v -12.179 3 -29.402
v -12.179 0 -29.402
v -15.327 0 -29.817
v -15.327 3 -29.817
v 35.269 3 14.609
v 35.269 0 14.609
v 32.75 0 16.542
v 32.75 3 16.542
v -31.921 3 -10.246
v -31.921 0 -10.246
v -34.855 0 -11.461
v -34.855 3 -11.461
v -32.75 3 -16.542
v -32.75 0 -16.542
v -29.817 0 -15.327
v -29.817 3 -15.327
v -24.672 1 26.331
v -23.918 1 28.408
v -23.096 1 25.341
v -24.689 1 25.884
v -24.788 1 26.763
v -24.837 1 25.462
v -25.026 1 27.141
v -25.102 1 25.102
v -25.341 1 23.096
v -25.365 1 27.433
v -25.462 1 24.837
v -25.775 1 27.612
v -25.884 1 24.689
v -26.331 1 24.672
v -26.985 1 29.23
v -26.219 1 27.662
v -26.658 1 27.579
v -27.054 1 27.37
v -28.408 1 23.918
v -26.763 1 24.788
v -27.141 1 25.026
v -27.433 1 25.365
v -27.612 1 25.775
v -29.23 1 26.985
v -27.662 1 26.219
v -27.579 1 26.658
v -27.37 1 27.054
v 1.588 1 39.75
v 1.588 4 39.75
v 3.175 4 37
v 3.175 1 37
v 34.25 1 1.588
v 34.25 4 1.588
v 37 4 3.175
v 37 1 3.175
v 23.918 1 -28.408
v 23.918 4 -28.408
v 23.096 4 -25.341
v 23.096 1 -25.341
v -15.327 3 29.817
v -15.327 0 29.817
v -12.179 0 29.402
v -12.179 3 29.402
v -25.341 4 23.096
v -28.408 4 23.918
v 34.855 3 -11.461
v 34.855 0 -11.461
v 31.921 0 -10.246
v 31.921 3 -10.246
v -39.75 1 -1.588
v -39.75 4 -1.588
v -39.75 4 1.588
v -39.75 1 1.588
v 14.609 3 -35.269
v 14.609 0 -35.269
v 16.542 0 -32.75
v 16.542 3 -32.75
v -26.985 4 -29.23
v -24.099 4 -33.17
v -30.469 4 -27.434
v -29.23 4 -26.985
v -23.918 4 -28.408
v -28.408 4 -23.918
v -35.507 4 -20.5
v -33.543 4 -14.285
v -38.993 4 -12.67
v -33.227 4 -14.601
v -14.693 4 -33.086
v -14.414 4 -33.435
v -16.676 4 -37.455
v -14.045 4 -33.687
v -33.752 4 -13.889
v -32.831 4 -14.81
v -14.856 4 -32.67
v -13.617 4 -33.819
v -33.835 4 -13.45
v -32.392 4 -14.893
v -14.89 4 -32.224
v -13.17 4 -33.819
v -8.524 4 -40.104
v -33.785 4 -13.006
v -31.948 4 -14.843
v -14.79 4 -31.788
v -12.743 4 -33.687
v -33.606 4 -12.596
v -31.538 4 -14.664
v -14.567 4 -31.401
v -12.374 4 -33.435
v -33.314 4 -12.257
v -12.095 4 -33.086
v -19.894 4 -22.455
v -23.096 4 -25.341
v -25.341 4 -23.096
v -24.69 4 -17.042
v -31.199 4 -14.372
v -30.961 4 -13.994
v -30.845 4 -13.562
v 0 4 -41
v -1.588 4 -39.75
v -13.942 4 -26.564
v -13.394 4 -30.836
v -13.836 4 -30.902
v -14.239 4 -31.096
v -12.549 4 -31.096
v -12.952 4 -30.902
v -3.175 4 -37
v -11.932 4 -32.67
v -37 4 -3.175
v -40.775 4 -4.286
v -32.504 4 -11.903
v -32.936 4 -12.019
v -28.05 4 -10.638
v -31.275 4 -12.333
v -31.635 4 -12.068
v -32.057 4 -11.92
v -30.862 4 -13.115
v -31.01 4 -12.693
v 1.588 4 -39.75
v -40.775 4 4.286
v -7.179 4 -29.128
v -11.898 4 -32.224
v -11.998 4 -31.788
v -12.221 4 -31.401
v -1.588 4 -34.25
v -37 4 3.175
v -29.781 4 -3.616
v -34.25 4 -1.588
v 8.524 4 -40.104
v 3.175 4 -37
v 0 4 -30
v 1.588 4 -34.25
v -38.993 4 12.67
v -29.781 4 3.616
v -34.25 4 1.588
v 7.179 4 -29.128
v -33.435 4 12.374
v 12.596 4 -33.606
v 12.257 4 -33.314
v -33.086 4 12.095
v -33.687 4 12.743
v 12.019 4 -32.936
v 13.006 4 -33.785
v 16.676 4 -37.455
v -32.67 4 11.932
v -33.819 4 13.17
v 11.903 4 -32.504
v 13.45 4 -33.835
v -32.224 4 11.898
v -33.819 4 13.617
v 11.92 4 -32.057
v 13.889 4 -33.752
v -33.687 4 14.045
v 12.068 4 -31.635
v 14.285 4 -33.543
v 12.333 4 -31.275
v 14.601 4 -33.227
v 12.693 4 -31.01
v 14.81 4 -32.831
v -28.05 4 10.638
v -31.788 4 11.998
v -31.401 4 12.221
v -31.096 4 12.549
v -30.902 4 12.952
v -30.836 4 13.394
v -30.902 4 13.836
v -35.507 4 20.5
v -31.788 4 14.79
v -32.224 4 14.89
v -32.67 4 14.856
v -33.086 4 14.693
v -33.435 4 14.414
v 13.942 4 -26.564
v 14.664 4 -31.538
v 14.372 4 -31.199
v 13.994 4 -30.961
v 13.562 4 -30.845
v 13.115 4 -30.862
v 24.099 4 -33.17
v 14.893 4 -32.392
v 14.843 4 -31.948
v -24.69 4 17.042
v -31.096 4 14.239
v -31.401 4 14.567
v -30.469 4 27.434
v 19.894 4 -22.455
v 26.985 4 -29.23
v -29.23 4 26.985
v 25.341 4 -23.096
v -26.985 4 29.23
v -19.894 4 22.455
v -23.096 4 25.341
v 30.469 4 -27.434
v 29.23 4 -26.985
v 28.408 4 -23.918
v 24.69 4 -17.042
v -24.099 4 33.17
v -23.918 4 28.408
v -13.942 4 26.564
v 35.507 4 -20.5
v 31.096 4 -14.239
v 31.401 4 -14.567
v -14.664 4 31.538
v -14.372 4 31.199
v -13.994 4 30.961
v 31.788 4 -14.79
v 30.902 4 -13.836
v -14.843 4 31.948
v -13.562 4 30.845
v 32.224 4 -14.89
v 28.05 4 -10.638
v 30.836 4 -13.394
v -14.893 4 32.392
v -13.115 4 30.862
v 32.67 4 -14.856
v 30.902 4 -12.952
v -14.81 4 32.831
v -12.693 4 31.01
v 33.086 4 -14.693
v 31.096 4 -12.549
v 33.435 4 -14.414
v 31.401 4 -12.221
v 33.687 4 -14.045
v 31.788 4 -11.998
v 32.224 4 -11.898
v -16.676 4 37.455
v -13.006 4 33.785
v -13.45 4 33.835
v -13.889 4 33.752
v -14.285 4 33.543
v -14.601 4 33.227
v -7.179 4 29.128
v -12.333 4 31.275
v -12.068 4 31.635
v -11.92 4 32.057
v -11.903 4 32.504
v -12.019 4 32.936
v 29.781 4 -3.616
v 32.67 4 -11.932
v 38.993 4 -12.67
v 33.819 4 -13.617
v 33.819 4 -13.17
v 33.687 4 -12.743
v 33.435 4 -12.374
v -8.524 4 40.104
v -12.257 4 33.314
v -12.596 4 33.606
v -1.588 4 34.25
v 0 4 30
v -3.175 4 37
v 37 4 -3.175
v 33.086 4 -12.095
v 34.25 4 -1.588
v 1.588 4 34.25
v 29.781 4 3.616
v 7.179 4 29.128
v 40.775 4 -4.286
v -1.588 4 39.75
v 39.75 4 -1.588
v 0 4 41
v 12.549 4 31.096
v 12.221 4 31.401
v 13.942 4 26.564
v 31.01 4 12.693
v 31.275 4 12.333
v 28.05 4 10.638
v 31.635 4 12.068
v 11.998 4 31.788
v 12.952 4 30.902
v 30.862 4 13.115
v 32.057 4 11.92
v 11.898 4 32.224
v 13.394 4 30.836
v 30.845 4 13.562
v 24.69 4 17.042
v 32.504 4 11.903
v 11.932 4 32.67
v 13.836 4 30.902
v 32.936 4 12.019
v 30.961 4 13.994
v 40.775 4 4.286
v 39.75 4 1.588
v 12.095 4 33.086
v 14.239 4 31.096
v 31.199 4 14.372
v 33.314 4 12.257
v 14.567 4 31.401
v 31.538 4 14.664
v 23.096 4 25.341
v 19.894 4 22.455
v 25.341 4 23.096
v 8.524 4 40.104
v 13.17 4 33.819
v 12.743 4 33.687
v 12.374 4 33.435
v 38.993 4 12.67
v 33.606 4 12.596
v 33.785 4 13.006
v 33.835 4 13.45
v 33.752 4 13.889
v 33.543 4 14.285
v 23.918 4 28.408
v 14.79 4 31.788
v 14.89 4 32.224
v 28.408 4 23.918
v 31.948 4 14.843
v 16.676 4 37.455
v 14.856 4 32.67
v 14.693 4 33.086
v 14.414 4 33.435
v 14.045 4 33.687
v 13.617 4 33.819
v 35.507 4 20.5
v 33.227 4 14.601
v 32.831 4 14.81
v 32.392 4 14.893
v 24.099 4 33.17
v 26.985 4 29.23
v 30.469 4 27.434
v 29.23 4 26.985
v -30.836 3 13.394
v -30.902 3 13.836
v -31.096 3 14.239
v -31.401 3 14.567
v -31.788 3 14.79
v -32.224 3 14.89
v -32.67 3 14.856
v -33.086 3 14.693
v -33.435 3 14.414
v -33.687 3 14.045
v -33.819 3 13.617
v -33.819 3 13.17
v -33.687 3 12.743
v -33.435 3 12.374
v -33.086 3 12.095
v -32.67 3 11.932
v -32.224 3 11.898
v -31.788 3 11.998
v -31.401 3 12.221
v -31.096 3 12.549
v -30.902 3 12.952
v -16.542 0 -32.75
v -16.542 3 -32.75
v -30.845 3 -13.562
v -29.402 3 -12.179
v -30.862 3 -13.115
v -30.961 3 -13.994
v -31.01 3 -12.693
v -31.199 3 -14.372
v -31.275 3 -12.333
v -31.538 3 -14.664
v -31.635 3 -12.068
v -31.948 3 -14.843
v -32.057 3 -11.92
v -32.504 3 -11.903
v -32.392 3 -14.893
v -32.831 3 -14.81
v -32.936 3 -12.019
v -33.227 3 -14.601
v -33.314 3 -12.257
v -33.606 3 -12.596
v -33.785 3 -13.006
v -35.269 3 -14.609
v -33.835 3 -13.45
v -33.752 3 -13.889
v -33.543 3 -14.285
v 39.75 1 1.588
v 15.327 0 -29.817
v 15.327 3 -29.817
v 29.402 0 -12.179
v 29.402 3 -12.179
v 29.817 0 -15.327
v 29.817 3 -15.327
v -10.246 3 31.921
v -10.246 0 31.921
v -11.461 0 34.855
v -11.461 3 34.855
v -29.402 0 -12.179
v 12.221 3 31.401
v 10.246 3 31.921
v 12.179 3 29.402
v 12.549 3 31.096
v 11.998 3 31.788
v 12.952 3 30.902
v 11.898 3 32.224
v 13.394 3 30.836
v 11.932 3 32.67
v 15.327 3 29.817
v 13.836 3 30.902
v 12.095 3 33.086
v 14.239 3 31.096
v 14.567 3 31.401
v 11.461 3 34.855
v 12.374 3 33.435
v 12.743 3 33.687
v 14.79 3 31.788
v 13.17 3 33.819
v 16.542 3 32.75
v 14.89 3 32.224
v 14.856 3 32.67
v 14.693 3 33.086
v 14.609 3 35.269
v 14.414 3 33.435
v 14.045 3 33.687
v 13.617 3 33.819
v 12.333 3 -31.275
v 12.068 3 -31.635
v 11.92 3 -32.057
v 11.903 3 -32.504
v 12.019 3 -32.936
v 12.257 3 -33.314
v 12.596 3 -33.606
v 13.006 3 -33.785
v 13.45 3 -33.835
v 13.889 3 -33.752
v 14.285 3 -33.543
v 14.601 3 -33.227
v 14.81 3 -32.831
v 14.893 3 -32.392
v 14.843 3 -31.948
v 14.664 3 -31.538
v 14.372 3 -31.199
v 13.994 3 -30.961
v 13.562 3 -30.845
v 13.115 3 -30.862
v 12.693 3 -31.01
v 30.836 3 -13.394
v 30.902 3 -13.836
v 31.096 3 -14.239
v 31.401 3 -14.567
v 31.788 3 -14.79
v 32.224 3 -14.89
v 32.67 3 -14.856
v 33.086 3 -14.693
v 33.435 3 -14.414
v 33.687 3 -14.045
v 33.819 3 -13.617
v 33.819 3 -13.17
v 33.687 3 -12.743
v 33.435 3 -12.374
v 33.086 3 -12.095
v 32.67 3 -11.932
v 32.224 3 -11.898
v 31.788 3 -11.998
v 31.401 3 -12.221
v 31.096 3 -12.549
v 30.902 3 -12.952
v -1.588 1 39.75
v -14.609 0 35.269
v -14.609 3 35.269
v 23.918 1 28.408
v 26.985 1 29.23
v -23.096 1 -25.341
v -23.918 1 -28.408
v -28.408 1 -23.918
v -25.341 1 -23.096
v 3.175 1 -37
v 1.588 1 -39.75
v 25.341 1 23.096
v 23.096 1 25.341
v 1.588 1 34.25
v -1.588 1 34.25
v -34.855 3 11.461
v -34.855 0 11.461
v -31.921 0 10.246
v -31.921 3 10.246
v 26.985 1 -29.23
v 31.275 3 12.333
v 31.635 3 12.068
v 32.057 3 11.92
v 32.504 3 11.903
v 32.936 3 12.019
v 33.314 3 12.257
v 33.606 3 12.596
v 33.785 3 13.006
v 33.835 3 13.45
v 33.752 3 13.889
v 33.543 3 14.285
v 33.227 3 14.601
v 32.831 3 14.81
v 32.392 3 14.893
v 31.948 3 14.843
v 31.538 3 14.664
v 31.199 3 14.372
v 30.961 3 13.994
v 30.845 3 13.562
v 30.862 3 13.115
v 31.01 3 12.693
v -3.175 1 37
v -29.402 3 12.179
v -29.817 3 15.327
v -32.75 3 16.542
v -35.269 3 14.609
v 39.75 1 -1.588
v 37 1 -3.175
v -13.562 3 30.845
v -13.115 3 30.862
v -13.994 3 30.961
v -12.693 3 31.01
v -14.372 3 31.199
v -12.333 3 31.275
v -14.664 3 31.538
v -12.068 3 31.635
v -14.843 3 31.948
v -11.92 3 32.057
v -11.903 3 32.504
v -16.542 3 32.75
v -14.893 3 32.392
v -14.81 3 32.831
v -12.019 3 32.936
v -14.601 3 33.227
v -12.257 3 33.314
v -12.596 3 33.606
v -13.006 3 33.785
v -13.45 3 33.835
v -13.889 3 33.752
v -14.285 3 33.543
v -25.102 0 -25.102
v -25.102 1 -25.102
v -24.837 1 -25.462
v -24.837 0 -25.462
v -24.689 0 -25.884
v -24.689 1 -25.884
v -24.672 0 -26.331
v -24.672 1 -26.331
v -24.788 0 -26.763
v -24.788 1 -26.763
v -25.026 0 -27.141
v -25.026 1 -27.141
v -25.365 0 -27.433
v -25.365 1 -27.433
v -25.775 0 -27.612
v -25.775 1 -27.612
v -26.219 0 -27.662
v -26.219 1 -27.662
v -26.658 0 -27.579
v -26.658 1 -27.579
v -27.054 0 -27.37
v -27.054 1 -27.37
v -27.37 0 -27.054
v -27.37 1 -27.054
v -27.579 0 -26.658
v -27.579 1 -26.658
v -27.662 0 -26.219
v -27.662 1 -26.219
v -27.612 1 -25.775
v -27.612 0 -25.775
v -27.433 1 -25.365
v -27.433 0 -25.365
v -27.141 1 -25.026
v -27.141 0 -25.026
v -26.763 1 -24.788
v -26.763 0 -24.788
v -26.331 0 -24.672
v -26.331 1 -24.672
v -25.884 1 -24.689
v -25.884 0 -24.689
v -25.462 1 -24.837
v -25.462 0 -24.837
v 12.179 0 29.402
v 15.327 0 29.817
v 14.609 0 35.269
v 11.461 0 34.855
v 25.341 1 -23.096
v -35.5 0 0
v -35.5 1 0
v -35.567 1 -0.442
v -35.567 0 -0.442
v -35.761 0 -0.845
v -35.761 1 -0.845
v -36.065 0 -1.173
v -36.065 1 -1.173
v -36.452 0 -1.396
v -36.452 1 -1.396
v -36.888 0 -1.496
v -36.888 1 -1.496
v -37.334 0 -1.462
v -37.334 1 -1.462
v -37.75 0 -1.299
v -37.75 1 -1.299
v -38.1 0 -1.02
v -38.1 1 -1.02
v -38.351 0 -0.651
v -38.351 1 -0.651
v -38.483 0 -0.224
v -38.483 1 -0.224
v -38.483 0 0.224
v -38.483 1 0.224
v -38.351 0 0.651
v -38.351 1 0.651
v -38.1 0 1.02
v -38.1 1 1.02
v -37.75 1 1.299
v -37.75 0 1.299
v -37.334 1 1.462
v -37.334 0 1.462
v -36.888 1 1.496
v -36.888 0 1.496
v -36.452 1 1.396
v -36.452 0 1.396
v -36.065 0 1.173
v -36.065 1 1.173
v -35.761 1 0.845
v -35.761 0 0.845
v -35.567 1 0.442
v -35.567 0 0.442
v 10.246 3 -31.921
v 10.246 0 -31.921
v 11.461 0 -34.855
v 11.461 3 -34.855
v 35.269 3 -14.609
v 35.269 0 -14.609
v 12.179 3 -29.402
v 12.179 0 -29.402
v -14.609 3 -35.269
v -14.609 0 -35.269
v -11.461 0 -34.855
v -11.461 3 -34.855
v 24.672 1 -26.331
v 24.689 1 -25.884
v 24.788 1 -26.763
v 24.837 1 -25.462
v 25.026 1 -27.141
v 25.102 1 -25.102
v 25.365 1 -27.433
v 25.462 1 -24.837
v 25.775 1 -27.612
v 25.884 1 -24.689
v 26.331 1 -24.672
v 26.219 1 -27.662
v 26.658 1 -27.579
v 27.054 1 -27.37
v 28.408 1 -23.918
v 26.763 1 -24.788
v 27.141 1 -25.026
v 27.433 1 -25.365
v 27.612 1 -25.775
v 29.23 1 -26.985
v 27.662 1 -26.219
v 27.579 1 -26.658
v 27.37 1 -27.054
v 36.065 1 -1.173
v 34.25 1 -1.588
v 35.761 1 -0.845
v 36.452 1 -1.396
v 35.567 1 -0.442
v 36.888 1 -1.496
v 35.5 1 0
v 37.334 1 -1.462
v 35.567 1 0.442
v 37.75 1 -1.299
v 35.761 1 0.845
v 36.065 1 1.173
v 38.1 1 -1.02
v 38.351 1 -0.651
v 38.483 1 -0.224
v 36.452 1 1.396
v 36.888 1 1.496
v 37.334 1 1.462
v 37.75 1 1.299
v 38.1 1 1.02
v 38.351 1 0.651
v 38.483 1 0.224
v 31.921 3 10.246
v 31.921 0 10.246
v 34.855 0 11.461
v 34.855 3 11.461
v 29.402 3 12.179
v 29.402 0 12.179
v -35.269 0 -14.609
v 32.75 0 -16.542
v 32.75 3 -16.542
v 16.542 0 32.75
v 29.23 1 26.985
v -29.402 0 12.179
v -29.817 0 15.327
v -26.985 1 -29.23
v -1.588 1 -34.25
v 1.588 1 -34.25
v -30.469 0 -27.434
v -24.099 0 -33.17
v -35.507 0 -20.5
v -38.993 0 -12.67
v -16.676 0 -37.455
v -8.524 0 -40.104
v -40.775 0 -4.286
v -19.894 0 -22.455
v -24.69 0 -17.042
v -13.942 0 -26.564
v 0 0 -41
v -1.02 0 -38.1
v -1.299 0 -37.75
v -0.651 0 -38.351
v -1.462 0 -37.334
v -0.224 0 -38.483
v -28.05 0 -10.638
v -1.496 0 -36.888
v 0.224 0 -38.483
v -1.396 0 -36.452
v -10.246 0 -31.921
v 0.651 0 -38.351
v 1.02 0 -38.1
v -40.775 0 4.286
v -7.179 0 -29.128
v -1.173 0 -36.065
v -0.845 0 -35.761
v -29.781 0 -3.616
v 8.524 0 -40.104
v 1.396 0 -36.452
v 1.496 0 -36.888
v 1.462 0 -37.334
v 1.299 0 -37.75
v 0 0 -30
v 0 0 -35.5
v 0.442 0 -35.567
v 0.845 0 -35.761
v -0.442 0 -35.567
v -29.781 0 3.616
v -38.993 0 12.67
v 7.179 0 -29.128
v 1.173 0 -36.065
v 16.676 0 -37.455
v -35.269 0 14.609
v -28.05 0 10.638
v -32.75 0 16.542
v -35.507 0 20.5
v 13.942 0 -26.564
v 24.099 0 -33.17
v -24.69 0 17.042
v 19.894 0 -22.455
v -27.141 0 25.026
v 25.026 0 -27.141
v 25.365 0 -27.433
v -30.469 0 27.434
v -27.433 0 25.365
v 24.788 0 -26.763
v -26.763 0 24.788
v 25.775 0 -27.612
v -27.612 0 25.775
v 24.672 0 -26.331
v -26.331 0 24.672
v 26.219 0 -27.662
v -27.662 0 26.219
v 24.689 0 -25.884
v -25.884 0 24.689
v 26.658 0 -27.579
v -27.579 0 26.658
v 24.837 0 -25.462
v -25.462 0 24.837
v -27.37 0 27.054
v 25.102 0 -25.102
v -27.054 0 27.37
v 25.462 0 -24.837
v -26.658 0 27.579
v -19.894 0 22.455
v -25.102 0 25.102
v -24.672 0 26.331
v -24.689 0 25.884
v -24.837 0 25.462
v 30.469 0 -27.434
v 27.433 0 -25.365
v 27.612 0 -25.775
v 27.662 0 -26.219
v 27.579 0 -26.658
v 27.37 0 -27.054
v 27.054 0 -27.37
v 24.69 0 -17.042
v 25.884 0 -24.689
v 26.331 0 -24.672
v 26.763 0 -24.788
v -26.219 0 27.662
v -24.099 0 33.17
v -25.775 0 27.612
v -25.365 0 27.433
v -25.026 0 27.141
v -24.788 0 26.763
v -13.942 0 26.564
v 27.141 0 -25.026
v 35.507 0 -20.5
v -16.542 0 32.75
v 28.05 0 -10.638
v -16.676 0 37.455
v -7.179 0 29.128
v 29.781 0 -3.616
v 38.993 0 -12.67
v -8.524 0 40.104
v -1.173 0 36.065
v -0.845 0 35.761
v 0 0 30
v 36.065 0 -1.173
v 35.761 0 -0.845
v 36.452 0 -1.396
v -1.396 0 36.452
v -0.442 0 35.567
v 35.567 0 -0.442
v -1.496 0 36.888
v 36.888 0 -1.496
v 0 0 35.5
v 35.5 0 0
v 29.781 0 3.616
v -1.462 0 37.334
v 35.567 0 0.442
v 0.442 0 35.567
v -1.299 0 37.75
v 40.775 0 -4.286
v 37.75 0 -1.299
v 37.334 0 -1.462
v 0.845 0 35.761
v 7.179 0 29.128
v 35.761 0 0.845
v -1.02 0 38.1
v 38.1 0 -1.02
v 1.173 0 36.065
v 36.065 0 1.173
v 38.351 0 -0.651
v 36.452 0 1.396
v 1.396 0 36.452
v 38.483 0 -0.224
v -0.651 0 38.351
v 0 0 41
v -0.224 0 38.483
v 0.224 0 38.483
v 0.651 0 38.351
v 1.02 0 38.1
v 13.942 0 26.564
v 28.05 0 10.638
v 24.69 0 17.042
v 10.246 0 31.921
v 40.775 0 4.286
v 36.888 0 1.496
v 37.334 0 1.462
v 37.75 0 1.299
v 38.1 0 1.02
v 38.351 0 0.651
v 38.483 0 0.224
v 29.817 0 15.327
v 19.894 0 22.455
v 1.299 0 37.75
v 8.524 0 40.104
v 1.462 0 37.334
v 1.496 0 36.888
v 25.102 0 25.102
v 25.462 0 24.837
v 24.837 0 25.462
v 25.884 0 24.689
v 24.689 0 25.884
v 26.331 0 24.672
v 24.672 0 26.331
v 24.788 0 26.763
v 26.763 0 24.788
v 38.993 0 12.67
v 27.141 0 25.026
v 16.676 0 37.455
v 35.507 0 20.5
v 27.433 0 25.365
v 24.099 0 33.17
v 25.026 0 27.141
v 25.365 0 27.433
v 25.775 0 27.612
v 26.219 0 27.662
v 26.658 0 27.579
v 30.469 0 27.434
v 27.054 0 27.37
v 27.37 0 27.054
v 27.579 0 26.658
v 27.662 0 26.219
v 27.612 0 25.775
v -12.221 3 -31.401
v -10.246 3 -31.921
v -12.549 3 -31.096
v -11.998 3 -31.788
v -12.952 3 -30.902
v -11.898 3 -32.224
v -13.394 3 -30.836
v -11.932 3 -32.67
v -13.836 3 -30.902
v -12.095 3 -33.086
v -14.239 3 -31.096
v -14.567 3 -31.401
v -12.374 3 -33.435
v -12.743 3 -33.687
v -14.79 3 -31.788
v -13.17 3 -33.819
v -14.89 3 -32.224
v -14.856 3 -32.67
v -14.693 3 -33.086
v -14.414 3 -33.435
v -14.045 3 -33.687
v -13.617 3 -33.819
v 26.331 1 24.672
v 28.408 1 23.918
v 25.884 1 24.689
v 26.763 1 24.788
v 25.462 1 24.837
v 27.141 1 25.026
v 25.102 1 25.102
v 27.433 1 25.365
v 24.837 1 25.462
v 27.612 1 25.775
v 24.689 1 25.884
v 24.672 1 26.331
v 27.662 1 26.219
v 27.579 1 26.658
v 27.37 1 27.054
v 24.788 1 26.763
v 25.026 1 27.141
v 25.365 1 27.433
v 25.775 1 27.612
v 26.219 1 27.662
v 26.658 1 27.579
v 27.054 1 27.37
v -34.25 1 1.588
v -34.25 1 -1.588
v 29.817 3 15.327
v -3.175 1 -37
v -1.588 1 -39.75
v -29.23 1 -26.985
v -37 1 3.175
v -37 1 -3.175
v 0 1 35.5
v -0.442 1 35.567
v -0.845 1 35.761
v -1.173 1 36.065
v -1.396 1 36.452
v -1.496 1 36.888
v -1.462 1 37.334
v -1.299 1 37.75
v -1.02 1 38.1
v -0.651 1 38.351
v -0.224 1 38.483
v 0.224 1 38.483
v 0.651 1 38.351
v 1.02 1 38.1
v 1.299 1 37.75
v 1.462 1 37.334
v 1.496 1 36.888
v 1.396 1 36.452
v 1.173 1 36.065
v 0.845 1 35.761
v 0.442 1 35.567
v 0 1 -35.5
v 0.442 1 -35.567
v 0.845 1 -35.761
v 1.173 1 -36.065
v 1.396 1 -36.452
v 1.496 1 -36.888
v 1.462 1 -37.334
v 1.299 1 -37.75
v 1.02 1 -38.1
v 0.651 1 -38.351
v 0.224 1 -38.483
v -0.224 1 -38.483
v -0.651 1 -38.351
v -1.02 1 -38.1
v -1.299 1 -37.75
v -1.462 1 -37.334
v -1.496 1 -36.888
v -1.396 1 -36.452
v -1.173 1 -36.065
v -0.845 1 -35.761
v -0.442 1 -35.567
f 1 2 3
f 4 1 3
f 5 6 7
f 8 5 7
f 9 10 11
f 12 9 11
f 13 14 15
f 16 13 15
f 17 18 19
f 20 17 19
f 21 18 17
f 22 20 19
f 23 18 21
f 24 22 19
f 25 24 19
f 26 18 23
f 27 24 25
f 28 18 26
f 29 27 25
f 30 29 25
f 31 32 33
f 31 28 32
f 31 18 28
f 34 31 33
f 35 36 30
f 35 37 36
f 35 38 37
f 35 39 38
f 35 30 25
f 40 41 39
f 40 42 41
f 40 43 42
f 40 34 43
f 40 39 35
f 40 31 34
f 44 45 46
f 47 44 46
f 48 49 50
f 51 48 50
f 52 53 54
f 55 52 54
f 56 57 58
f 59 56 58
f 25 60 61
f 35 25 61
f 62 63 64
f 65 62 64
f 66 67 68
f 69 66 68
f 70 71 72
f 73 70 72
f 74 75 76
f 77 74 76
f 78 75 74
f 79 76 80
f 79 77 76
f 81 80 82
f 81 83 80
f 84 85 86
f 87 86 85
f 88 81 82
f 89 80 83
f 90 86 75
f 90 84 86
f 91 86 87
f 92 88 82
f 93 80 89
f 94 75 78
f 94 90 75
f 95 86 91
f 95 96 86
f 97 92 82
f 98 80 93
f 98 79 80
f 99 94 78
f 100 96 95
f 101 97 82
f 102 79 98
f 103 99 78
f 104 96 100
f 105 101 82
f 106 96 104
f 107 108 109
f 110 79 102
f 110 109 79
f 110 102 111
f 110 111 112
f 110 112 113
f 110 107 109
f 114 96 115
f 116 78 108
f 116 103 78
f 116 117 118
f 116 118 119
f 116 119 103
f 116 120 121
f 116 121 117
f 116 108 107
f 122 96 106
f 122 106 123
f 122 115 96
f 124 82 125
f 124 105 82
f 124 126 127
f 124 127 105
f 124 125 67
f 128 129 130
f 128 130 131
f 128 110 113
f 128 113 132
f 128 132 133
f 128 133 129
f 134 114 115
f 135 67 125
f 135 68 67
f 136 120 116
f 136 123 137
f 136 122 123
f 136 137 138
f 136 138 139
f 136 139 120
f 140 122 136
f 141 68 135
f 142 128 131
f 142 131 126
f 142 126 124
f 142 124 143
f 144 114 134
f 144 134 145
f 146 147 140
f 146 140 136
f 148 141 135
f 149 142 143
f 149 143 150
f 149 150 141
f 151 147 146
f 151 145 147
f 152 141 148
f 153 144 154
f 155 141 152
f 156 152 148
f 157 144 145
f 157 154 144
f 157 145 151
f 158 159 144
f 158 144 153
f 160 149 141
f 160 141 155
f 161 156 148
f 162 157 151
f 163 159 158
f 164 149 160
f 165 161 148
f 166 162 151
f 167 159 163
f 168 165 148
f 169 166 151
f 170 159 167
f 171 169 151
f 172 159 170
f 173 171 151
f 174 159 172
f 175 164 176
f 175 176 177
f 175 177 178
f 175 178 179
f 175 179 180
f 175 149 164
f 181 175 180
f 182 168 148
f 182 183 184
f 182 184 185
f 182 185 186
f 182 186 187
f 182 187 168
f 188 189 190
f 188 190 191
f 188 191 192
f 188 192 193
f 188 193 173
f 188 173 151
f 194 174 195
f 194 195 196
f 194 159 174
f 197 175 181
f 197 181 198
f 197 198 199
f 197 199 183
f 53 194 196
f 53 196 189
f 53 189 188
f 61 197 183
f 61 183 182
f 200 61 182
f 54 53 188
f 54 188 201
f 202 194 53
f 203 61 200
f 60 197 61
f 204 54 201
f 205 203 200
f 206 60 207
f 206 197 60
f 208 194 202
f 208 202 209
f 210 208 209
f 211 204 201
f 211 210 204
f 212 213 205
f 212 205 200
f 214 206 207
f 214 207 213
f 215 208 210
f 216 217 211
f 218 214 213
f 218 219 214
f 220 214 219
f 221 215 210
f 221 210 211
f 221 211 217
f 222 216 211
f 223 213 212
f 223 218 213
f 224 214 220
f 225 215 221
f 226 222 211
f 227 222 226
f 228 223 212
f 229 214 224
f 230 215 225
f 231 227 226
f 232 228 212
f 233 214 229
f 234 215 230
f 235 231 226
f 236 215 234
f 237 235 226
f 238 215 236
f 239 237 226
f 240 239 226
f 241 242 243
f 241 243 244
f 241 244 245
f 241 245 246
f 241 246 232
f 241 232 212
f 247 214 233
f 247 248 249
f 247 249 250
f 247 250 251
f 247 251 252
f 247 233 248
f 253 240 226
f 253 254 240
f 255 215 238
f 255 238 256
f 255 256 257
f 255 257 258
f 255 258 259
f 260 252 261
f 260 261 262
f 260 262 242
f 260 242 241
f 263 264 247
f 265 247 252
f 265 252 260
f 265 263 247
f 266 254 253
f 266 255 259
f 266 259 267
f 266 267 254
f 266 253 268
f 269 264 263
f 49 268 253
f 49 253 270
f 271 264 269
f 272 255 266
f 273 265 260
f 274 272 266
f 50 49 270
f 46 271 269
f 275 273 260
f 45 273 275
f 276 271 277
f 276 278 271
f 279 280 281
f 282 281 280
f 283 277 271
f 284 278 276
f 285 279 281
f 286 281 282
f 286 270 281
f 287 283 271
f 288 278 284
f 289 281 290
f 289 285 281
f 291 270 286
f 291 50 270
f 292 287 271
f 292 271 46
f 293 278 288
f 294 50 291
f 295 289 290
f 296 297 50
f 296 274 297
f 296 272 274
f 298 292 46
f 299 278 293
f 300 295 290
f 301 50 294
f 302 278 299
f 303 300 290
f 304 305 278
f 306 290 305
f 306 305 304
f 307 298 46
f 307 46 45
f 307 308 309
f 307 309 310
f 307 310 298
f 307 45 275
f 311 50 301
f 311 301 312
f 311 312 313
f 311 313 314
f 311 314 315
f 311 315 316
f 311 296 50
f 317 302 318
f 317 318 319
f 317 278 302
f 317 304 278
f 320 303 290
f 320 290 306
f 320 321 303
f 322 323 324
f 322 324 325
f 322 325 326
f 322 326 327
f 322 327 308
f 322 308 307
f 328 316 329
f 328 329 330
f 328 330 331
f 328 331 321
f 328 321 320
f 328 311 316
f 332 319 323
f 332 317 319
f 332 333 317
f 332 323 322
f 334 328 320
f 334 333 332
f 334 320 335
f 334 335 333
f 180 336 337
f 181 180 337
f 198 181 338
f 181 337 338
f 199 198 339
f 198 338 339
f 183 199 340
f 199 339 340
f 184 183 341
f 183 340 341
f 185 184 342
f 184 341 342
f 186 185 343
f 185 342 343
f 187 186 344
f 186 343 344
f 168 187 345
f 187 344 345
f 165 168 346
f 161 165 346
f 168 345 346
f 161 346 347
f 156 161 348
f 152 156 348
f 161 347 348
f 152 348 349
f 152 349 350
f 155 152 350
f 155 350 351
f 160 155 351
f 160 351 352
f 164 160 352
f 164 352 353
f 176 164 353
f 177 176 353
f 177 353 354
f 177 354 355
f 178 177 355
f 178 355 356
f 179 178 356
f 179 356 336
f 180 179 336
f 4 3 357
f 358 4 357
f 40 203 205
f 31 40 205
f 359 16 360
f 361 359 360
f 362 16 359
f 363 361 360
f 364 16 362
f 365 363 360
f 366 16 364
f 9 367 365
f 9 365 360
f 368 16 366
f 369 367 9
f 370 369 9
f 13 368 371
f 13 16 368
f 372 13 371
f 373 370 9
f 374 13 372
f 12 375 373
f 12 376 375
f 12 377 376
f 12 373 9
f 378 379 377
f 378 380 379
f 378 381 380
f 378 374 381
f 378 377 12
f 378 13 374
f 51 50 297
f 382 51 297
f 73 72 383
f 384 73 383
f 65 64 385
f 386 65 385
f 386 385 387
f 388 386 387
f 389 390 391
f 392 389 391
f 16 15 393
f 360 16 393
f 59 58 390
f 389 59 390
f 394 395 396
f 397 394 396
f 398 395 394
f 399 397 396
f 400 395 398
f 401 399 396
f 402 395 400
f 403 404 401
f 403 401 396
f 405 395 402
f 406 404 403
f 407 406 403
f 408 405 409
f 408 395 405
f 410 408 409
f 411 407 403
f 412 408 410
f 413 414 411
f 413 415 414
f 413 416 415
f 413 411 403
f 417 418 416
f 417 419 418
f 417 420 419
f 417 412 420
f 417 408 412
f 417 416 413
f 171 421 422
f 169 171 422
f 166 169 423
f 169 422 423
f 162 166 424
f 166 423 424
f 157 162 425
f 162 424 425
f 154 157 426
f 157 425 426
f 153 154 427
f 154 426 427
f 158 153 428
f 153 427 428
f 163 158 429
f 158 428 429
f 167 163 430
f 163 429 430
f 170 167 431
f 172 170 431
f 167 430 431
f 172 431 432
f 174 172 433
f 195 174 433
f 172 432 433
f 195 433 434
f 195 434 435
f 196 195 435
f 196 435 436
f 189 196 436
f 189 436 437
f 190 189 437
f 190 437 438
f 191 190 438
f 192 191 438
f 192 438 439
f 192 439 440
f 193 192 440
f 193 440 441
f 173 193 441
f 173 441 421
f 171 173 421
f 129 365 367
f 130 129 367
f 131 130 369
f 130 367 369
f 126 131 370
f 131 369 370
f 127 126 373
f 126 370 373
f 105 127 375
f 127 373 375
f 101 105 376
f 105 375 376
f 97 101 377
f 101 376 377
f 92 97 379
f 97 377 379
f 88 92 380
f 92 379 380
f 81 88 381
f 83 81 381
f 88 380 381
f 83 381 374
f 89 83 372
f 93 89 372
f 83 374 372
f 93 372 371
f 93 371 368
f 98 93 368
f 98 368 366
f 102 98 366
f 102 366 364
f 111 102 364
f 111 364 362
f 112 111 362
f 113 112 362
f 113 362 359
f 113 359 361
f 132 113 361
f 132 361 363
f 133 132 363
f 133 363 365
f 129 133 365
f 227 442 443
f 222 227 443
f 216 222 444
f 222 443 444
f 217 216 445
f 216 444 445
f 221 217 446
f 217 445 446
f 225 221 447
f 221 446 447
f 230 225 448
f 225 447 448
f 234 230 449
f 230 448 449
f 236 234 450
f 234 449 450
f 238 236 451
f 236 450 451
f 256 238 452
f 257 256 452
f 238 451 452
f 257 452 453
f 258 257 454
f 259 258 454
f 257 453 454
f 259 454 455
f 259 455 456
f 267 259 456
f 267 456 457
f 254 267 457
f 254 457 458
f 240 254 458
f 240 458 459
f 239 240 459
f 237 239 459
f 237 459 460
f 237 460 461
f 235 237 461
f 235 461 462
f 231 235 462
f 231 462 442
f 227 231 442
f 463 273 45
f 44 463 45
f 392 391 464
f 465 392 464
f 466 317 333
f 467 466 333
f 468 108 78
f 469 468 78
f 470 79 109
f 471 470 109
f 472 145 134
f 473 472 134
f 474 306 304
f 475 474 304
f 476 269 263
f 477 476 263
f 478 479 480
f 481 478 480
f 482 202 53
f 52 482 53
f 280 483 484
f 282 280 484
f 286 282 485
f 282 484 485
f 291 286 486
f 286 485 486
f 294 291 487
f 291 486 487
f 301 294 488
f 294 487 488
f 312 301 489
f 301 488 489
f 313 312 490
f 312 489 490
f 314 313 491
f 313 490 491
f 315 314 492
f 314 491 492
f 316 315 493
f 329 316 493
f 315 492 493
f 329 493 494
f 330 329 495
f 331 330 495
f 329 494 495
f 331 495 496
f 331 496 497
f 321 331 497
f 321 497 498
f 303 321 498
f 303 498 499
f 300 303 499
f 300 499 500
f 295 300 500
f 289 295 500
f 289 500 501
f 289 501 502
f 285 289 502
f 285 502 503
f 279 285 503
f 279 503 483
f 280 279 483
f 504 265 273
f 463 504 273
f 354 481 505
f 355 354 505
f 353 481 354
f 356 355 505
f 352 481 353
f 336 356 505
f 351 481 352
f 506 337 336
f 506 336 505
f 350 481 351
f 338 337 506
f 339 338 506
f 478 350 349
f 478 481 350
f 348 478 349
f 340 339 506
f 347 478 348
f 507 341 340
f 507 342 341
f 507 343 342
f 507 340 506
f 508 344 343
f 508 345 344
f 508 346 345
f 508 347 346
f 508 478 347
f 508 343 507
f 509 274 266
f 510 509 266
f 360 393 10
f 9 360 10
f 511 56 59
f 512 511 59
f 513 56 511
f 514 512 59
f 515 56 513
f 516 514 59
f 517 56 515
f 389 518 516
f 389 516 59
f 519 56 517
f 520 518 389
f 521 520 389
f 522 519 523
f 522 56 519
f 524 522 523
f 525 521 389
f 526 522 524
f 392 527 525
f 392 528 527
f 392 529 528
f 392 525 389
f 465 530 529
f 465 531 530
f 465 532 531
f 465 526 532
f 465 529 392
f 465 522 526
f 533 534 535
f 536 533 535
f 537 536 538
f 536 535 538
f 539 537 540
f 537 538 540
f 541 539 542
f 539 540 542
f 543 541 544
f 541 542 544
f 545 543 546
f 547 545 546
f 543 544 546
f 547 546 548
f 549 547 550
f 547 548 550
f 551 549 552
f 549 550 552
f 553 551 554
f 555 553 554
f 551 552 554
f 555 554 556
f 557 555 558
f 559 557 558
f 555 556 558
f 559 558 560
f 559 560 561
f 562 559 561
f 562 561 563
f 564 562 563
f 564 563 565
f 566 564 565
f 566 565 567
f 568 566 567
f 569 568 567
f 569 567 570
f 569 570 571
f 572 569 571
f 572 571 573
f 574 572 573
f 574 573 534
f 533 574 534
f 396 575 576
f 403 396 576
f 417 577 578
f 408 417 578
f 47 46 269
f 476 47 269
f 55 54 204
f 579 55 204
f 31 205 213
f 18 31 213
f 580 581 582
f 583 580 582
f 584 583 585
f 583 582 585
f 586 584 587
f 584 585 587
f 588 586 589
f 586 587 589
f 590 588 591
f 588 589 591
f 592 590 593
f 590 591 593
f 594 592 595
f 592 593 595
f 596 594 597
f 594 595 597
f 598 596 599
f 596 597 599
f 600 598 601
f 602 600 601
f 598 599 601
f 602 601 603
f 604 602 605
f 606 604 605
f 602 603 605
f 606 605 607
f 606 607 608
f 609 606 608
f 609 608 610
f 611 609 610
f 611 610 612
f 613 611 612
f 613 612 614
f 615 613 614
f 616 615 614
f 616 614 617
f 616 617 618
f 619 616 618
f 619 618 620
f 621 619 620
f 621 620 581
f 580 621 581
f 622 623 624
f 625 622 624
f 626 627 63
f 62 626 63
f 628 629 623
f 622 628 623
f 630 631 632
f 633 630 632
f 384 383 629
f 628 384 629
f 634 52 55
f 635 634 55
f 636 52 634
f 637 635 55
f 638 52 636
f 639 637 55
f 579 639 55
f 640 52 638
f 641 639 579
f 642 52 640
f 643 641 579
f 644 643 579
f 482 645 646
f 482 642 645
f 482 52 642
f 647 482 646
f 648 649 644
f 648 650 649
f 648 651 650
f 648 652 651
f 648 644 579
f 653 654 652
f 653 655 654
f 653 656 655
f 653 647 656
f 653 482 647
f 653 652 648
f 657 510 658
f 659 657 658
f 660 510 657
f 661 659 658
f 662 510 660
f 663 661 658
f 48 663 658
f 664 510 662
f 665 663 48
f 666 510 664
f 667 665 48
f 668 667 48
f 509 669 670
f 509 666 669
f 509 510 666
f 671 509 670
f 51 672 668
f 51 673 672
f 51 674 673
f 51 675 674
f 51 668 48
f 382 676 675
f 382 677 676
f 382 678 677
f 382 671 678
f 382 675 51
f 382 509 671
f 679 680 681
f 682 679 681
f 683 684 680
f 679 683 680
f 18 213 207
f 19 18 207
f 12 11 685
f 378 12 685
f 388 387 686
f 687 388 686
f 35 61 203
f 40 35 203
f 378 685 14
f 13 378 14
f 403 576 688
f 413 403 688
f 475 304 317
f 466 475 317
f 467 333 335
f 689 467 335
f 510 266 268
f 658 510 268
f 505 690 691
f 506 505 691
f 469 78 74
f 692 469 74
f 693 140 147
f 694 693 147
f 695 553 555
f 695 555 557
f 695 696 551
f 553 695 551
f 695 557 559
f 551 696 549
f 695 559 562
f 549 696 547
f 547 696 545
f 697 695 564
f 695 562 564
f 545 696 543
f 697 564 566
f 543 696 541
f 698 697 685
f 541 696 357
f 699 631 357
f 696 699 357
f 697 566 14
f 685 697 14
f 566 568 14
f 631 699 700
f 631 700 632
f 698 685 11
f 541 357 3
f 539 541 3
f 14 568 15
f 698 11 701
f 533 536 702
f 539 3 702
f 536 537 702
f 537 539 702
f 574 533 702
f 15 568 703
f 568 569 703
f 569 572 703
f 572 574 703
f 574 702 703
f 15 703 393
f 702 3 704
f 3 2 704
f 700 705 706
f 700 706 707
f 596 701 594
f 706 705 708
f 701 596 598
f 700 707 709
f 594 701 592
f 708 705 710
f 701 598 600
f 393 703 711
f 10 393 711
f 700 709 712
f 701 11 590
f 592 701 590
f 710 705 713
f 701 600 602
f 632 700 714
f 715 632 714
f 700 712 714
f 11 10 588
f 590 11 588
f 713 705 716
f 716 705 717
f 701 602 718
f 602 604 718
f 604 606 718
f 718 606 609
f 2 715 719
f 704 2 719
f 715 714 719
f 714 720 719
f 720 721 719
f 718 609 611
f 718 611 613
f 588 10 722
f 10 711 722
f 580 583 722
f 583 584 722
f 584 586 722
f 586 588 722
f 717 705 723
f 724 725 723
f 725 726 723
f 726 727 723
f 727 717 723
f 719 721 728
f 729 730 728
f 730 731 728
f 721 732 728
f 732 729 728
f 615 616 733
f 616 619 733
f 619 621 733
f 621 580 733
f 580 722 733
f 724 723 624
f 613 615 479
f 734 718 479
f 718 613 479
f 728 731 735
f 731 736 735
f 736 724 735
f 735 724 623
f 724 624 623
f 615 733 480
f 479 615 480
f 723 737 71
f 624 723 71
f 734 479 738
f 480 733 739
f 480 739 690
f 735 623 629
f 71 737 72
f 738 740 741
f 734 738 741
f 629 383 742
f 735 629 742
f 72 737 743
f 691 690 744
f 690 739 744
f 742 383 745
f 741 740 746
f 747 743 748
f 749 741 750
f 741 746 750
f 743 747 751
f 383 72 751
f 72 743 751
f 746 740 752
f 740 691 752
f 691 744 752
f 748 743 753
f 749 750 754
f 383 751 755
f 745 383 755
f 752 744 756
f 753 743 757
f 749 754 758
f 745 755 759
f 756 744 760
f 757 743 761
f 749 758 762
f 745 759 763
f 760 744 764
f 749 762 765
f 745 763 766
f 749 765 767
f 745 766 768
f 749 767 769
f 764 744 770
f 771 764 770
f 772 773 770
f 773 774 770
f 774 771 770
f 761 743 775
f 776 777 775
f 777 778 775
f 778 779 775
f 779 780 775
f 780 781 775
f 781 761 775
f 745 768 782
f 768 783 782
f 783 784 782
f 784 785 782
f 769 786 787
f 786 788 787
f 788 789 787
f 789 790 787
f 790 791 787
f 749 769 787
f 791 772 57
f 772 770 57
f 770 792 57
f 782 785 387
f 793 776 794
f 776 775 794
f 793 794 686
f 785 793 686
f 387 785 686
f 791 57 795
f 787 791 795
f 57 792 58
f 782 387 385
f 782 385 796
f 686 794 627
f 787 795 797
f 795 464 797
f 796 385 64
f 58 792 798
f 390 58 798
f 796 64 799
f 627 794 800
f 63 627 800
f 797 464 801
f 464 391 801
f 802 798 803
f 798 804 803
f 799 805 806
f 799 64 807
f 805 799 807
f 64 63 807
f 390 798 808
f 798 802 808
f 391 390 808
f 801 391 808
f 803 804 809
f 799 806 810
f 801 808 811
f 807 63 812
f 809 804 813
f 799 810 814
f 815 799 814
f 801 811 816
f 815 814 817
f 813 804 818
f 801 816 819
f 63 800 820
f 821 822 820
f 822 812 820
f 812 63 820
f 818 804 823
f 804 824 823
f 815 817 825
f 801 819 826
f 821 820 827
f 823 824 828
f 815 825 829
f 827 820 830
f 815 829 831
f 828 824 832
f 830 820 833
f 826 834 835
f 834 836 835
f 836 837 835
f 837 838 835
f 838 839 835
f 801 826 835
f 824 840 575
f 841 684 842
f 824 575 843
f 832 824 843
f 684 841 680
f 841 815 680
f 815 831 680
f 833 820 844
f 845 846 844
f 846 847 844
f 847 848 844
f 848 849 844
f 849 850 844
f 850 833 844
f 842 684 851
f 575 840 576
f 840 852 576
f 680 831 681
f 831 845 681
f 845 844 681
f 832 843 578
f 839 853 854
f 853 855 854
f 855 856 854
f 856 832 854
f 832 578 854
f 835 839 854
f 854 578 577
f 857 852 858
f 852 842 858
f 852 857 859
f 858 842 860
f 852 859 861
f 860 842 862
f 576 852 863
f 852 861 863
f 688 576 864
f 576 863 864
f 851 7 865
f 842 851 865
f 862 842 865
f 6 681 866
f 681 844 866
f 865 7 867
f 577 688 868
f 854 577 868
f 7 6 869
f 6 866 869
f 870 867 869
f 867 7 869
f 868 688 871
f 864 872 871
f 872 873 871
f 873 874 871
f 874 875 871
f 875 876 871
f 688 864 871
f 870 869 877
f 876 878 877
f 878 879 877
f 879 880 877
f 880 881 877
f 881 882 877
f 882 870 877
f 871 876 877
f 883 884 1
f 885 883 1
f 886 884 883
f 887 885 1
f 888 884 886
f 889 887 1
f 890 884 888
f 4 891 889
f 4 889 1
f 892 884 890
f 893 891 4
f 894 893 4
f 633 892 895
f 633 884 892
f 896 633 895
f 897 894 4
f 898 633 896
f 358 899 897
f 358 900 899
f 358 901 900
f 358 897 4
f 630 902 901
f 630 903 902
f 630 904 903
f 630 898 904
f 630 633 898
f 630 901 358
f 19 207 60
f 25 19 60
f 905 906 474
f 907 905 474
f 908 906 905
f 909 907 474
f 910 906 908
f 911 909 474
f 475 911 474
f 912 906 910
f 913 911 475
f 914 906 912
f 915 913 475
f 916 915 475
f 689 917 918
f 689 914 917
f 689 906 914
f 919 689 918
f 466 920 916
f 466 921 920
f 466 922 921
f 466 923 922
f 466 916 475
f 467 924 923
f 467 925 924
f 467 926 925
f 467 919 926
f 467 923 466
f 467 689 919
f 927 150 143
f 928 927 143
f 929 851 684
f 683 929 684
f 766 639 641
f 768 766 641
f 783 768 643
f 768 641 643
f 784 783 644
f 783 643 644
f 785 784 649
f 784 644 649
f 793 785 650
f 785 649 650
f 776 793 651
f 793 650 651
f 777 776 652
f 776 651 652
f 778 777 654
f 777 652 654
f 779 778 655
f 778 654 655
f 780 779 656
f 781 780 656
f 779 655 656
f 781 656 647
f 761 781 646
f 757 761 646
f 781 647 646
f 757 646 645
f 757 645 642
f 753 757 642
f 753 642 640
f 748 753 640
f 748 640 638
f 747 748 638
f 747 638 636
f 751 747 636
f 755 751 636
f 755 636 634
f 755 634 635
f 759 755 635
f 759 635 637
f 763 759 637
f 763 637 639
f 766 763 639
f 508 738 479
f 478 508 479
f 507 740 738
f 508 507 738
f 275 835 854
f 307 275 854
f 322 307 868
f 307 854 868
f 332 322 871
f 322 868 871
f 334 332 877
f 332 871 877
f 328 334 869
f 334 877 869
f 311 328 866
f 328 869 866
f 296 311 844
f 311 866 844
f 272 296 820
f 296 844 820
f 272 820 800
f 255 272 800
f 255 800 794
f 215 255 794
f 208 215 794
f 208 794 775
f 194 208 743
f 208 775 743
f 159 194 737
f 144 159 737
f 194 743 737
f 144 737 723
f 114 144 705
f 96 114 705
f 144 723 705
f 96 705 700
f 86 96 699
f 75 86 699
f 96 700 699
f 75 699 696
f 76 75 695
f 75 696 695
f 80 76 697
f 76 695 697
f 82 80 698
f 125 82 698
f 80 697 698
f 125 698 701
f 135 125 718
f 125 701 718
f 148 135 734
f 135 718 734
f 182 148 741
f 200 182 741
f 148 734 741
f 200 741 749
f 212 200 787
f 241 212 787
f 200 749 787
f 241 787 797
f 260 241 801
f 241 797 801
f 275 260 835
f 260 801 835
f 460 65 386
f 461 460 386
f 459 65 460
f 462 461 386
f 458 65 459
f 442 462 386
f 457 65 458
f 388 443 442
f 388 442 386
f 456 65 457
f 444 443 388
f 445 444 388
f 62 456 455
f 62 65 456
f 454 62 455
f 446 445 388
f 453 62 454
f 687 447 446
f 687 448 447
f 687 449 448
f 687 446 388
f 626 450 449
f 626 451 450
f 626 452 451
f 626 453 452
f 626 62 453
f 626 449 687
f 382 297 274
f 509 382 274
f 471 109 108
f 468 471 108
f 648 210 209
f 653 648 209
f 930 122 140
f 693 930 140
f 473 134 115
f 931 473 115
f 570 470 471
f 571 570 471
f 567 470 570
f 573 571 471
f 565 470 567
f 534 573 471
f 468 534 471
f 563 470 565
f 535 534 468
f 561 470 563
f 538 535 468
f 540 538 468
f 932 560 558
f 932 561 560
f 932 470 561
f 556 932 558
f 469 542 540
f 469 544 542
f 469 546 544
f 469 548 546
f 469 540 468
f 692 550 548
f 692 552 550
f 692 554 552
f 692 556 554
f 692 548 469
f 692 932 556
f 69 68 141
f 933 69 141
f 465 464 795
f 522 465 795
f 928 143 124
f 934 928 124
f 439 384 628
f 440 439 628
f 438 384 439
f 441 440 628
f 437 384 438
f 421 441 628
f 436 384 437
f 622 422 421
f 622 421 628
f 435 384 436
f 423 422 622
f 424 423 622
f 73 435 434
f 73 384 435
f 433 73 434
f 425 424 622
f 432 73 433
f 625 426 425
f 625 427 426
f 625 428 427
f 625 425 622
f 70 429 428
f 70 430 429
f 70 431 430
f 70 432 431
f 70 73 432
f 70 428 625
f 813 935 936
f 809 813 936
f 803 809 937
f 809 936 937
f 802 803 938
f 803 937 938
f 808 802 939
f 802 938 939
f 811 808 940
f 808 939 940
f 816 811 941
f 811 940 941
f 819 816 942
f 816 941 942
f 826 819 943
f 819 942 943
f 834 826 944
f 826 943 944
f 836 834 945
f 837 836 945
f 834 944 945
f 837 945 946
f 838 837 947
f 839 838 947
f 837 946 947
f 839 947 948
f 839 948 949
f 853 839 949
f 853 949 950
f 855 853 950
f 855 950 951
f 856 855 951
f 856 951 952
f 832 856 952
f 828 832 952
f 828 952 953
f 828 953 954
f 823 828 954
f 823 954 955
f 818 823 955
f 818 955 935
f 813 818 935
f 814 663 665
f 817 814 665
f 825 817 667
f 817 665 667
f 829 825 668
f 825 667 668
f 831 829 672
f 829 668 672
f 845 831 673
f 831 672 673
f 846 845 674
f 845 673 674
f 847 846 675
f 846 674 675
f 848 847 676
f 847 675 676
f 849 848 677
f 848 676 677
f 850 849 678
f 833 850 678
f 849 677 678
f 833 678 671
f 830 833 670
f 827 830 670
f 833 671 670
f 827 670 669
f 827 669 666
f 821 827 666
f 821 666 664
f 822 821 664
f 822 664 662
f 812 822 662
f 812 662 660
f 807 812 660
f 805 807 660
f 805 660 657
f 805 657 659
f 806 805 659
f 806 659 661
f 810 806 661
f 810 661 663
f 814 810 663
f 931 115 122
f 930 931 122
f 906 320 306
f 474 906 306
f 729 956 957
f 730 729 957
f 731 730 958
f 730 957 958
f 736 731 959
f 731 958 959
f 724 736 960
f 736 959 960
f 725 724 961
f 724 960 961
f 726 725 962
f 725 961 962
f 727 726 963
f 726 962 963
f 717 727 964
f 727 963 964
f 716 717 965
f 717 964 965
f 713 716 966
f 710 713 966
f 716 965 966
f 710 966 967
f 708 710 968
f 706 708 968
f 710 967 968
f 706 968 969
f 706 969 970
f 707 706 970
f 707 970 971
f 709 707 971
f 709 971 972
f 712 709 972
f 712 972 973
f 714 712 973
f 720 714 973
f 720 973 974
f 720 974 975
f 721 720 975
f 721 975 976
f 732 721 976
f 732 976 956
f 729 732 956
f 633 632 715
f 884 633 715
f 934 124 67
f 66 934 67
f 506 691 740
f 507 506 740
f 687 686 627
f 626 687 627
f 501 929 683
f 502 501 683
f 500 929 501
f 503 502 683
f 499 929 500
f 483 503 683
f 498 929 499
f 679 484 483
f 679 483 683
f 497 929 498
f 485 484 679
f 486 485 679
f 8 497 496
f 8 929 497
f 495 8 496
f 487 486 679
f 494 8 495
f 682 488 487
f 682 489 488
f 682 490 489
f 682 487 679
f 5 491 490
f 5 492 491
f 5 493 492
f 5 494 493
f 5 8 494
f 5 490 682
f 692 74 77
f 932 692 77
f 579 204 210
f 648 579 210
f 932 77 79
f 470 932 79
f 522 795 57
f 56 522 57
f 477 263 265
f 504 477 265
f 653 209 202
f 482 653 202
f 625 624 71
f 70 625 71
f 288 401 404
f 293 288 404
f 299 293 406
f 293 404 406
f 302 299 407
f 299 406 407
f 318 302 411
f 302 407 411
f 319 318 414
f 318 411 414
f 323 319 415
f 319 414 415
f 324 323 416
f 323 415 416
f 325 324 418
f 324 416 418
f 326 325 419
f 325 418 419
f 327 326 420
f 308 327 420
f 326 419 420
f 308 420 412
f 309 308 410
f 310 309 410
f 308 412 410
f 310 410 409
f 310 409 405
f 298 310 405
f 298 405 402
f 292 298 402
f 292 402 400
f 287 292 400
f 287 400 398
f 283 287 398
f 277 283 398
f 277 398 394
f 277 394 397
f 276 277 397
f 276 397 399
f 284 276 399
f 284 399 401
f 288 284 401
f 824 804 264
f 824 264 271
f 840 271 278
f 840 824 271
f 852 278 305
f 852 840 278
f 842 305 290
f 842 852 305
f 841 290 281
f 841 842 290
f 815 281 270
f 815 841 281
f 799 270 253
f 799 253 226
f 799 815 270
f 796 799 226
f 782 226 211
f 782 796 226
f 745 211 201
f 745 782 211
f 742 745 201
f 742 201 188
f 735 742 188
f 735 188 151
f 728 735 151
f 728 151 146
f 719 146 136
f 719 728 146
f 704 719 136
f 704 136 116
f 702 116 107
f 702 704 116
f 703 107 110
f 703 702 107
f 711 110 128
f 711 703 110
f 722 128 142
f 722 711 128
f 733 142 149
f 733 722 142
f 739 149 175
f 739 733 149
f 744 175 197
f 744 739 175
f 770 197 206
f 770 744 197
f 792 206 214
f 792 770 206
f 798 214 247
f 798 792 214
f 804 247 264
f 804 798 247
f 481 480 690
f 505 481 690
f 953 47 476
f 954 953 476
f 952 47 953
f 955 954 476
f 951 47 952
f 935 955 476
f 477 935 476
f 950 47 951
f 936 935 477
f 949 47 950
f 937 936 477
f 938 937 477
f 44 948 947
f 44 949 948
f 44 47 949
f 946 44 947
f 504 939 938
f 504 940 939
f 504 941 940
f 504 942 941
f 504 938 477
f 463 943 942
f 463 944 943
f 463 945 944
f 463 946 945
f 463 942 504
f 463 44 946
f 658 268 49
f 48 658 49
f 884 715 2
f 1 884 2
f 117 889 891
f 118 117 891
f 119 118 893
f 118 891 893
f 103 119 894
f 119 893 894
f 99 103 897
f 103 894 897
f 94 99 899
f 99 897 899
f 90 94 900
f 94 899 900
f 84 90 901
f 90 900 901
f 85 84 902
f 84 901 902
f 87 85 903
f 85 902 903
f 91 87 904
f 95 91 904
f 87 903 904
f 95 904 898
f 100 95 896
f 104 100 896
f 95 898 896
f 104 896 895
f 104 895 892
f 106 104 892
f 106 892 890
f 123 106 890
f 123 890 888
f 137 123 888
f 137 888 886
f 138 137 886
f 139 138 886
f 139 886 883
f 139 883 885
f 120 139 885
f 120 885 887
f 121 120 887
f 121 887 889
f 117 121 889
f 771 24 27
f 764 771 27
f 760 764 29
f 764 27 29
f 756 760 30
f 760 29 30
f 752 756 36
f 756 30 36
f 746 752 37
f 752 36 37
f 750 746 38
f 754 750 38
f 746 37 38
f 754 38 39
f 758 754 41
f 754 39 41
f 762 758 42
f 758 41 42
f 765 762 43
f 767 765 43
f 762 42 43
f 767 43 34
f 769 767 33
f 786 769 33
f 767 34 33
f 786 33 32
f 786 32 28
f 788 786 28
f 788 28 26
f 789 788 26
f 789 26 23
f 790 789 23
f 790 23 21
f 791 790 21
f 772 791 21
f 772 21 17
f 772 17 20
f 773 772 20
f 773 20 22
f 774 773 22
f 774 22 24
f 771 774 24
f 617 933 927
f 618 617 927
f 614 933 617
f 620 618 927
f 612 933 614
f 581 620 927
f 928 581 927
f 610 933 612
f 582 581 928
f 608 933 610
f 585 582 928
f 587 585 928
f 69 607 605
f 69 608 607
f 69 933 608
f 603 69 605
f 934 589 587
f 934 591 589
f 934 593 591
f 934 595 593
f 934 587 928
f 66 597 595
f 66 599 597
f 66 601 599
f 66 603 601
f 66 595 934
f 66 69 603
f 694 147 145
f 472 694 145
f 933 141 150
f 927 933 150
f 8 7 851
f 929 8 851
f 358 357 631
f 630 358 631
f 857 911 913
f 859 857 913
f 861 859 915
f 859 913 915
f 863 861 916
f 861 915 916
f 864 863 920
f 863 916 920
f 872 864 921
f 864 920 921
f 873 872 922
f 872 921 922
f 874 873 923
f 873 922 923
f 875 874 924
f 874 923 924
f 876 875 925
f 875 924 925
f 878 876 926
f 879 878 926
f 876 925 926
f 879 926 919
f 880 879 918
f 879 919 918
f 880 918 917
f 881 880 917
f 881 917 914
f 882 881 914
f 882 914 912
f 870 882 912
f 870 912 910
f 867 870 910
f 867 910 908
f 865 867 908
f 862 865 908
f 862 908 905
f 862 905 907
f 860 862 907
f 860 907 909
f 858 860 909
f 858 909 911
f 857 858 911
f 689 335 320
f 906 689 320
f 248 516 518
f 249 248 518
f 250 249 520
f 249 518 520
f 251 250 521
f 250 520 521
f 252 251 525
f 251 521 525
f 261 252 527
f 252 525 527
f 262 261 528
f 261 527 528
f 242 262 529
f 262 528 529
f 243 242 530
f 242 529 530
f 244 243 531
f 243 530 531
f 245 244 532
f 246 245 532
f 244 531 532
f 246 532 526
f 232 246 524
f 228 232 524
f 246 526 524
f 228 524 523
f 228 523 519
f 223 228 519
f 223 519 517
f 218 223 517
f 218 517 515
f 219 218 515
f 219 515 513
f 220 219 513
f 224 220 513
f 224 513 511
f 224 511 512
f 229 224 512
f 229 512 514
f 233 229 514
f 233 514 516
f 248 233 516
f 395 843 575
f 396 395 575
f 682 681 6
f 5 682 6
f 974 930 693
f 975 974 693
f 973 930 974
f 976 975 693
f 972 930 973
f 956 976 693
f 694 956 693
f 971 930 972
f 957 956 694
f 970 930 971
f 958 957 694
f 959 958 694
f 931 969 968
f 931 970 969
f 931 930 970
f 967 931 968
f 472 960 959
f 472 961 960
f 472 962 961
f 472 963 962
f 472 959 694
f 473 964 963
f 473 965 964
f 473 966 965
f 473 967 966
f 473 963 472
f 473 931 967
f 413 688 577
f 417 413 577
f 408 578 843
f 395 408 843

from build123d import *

# Parameters (mm, degrees)
SKETCH_2_R               = 41
SKETCH_2_R_2             = 30
EXTRUDE_1_DEPTH          = 4
SKETCH_3_R               = 1.5
CUT_EXTRUDE_1_DEPTH      = 59.120564347
CUT_EXTRUDE_2_DEPTH      = 3
PATTERN_CIRCULAR_1_COUNT = 24
SKETCH_5_R               = 1.5
CUT_EXTRUDE_3_DEPTH      = 59.120564347
CUT_EXTRUDE_4_DEPTH      = 3
PATTERN_CIRCULAR_2_COUNT = 24


with BuildPart() as part:
    # 草图2 → 凸台-拉伸1 (new body)
    with BuildSketch(Plane(origin=(0, 0, 0), x_dir=(1, 0, 0), z_dir=(0, 1, 0))):
        with Locations(Location((0, 0, 0), (0, 0, 270))):
            Circle(SKETCH_2_R)
        with Locations(Location((0, 0, 0), (0, 0, 270))):
            Circle(SKETCH_2_R_2, mode=Mode.SUBTRACT)
    extrude(amount=EXTRUDE_1_DEPTH)

    # 草图3 → 切除-拉伸1 (cut, through all)
    with BuildSketch(Plane(origin=(0, 4, 0), x_dir=(1, 0, 0), z_dir=(0, 1, 0))):
        with Locations(Location((0, 37, 0), (0, 0, 270))):
            Circle(SKETCH_3_R)
    cut_extrude_1 = extrude(amount=-CUT_EXTRUDE_1_DEPTH, mode=Mode.SUBTRACT)

    # 草图4 → 切除-拉伸2 (cut)
    with BuildSketch(Plane(origin=(0, 4, 0), x_dir=(1, 0, 0), z_dir=(0, 1, 0))):
        Polygon((3.175426481, 37), (1.58771324, 39.75), (-1.58771324, 39.75), (-3.175426481, 37), (-1.58771324, 34.25), (1.58771324, 34.25), align=None)
    cut_extrude_2 = extrude(amount=-CUT_EXTRUDE_2_DEPTH, mode=Mode.SUBTRACT)

    # 阵列(圆周)1: 切除-拉伸1, 切除-拉伸2 ×24 about axis, 16 skipped
    pattern_circular_1_axis = Axis((0, 4, 0), (0, 1, 0))
    add([cut_extrude_1.rotate(pattern_circular_1_axis, i * 360 / PATTERN_CIRCULAR_1_COUNT) for i in range(1, PATTERN_CIRCULAR_1_COUNT) if i not in (1, 2, 4, 5, 7, 8, 10, 11, 13, 14, 16, 17, 19, 20, 22, 23)], mode=Mode.SUBTRACT)
    add([cut_extrude_2.rotate(pattern_circular_1_axis, i * 360 / PATTERN_CIRCULAR_1_COUNT) for i in range(1, PATTERN_CIRCULAR_1_COUNT) if i not in (1, 2, 4, 5, 7, 8, 10, 11, 13, 14, 16, 17, 19, 20, 22, 23)], mode=Mode.SUBTRACT)

    # 草图5 → 切除-拉伸3 (cut, through all)
    with BuildSketch(Plane.XZ):
        with Locations(Location((13.393920133, 32.335783638, 0), (0, 0, 270))):
            Circle(SKETCH_5_R)
    cut_extrude_3 = extrude(amount=-CUT_EXTRUDE_3_DEPTH, mode=Mode.SUBTRACT)

    # 草图6 → 切除-拉伸4 (cut)
    with BuildSketch(Plane.XZ):
        Polygon((12.178737028, 29.402072106), (15.326997295, 29.816548433), (16.5421804, 32.750259965), (14.609103238, 35.26949517), (11.460842971, 34.855018843), (10.245659866, 31.921307311), align=None)
    cut_extrude_4 = extrude(amount=-CUT_EXTRUDE_4_DEPTH, mode=Mode.SUBTRACT)

    # 阵列(圆周)2: 切除-拉伸3, 切除-拉伸4 ×24 about axis, 16 skipped
    pattern_circular_2_axis = Axis((0, 0, 0), (0, 1, 0))
    add([cut_extrude_3.rotate(pattern_circular_2_axis, i * 360 / PATTERN_CIRCULAR_2_COUNT) for i in range(1, PATTERN_CIRCULAR_2_COUNT) if i not in (1, 2, 4, 5, 7, 8, 10, 11, 13, 14, 16, 17, 19, 20, 22, 23)], mode=Mode.SUBTRACT)
    add([cut_extrude_4.rotate(pattern_circular_2_axis, i * 360 / PATTERN_CIRCULAR_2_COUNT) for i in range(1, PATTERN_CIRCULAR_2_COUNT) if i not in (1, 2, 4, 5, 7, 8, 10, 11, 13, 14, 16, 17, 19, 20, 22, 23)], mode=Mode.SUBTRACT)


solid = part.part
